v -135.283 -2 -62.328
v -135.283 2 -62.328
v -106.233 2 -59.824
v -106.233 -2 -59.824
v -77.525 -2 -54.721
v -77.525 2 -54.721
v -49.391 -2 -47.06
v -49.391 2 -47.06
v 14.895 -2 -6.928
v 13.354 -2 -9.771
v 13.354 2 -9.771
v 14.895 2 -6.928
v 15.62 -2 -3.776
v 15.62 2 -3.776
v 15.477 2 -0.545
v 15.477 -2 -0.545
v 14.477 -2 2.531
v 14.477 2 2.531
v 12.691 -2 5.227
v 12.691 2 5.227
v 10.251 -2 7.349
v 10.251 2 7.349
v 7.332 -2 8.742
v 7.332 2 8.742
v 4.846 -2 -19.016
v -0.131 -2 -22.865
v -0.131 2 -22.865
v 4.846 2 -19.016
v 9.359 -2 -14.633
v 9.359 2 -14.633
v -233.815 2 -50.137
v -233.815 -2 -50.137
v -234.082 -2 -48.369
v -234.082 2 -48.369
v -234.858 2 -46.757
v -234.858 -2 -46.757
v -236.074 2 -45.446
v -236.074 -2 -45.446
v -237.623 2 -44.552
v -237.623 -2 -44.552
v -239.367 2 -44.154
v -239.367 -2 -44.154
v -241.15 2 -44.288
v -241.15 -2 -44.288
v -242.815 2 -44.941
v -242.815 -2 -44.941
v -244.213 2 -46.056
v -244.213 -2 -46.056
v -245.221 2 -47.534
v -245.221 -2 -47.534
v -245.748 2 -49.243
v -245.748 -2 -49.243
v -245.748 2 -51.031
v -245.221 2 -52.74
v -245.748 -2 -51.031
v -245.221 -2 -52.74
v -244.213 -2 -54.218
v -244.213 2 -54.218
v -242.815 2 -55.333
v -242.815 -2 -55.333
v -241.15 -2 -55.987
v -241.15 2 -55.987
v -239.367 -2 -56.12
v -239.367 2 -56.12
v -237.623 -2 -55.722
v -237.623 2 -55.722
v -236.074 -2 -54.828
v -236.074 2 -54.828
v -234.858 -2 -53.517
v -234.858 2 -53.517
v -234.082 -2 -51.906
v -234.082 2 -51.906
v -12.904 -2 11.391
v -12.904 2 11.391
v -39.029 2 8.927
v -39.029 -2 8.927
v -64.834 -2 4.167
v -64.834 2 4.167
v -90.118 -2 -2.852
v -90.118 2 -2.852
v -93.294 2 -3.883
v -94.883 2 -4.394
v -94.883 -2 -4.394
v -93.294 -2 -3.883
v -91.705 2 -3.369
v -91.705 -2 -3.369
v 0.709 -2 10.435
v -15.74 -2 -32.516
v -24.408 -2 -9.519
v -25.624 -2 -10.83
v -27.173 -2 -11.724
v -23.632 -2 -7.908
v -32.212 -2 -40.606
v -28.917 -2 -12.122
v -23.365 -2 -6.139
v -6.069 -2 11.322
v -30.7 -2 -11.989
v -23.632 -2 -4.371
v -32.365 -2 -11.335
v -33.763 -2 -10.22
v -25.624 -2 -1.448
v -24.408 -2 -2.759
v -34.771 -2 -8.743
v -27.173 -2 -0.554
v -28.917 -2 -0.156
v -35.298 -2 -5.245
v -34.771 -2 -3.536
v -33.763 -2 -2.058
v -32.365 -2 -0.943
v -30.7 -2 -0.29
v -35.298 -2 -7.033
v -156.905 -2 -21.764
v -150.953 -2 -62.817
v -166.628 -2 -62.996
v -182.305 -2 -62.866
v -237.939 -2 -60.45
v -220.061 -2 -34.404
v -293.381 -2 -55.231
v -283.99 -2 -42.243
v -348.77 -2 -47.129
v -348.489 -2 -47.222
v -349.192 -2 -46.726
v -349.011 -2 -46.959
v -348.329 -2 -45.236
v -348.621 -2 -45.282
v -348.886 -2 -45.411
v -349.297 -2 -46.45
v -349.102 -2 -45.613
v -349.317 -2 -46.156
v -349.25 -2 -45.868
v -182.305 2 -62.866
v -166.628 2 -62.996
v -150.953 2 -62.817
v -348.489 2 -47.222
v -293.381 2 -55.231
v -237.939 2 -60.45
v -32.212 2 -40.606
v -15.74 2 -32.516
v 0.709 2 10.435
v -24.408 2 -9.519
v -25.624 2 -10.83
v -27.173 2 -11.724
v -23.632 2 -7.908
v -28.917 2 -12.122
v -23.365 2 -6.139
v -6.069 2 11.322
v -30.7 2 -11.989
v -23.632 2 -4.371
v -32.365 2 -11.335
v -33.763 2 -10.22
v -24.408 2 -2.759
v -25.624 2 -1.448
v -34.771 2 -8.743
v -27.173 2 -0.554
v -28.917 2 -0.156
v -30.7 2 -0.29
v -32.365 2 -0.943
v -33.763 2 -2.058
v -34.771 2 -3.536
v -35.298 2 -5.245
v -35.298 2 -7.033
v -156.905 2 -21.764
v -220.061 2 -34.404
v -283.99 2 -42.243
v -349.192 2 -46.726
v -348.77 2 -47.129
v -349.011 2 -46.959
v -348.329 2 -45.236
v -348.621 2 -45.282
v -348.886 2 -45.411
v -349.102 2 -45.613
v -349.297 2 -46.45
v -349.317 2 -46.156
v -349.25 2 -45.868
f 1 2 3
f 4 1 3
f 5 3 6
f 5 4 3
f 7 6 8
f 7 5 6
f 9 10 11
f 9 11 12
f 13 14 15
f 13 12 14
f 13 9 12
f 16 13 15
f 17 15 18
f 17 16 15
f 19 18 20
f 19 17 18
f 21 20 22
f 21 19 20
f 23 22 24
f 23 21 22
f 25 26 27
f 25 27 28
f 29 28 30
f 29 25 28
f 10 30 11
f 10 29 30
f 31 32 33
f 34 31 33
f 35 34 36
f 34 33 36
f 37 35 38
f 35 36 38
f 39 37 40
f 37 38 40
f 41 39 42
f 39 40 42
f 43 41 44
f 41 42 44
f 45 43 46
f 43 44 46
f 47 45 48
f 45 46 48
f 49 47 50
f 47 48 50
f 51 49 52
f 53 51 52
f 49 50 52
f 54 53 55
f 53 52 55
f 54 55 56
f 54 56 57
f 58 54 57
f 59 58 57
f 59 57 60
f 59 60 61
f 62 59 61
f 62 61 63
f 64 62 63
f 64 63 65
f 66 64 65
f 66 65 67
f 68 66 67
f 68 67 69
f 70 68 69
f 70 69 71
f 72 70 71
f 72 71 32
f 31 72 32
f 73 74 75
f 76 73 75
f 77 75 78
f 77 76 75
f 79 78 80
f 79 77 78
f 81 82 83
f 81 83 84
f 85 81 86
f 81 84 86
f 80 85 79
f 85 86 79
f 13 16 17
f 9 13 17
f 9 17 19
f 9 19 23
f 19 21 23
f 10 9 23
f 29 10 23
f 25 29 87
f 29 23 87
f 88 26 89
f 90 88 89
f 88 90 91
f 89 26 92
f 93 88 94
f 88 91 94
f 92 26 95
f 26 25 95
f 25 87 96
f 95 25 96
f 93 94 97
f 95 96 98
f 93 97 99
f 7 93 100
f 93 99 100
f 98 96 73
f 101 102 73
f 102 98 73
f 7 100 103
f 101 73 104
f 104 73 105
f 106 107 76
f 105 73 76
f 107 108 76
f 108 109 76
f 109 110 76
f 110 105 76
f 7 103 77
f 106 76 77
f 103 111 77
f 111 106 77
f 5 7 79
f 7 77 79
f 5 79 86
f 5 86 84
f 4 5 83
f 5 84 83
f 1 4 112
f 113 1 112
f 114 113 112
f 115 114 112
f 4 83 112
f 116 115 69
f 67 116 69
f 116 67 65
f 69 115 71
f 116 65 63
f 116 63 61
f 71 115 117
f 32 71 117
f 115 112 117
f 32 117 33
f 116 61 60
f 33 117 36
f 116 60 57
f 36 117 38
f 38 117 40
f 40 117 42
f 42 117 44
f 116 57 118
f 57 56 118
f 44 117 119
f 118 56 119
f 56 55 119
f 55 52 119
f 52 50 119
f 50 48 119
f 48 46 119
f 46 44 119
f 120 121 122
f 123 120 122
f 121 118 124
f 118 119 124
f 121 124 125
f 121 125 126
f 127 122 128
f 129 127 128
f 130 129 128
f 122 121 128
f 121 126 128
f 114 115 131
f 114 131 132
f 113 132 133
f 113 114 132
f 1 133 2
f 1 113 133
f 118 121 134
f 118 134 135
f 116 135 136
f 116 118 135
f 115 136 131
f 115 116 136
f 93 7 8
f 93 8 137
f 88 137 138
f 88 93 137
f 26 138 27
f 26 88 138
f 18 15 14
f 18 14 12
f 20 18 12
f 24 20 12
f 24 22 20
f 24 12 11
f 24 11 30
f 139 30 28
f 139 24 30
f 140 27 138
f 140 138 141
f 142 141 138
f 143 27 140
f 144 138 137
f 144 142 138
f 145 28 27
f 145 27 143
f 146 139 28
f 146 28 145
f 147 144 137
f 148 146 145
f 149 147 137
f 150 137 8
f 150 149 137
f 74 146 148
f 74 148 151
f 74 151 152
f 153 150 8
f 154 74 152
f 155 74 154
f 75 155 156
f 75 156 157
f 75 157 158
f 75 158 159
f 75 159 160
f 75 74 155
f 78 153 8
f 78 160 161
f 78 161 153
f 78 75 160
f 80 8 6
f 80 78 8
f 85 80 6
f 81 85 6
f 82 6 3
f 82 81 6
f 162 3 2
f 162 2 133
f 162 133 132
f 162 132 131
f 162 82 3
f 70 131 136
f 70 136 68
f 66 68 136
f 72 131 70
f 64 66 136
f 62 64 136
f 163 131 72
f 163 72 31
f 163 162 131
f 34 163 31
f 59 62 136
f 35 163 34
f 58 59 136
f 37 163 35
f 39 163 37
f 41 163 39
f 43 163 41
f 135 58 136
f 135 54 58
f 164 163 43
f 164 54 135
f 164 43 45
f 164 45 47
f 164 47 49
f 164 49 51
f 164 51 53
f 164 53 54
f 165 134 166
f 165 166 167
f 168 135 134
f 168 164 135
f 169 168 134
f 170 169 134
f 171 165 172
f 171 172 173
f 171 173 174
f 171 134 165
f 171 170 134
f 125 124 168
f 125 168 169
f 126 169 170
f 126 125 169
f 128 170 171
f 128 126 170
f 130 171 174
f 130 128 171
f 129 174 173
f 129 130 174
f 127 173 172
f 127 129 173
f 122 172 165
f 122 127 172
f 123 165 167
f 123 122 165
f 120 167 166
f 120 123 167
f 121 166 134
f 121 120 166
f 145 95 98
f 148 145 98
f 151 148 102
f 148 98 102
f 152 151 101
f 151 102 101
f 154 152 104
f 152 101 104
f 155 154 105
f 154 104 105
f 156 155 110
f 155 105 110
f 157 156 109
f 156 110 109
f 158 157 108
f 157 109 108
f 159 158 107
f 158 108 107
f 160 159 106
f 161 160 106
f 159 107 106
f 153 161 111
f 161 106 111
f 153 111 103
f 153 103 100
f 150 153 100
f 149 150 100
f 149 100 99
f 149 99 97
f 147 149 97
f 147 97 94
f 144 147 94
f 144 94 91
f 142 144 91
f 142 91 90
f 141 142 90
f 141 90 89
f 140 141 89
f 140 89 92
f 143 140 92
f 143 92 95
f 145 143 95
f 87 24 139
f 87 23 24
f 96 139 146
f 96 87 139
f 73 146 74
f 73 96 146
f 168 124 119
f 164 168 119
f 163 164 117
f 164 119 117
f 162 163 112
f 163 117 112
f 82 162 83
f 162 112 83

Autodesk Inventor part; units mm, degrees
ref_plane "YZ Plane" through (0, 0, 0) normal (1, 0, 0) x (0, 1, 0)
ref_plane "XZ Plane" through (0, 0, 0) normal (0, 1, 0) x (-1, 0, 0)
ref_plane "XY Plane" through (0, 0, 0) normal (0, 0, 1) x (1, 0, 0)
sketch "スケッチ1" plane through (0, 0, 0) normal (0, 1, 0) x (-1, 0, 0)
  arc A0 (348.9954, -50.1786) -> (348.3553, -42.2361) centre (348.3204, -46.2359) ccw projected
  arc A1 (182.359, -65.8653) -> (348.9954, -50.1786) centre (162.2533, 1040.6287) ccw projected
  arc A2 (135.1603, -65.3257) -> (182.359, -65.8653) centre (167.871, 731.467) ccw projected
  arc A3 (48.4731, -49.9165) -> (135.1603, -65.3257) centre (148.588, 261.756) ccw projected
  arc A4 (-1.5687, -25.3375) -> (48.4731, -49.9165) centre (107.173, 132.825) ccw projected
  arc A5 (-15.7749, -11.5429) -> (-1.5687, -25.3375) centre (31.9, 23.342) ccw projected
  arc A6 (-8.2474, 11.5993) -> (-15.7749, -11.5429) centre (-3.6695, -2.6851) ccw projected
  arc A7 (13.0537, 14.3873) -> (-8.2474, 11.5993) centre (10.0641, -45.5382) ccw projected
  arc A8 (91.047, 0) -> (13.0537, 14.3873) centre (-1.8944, -285.2401) ccw projected
  arc A9 (91.047, 0) -> (95.8009, -1.5381) centre (462.8125, 1140.9603) ccw projected
  arc A10 (95.8009, -1.5381) -> (348.3553, -42.2361) centre (355.7675, 807.7316) ccw projected
  point P0 (0, 0)
extrude "押し出し1" add sketch "スケッチ1" along normal mid plane 4
sketch "スケッチ2" plane through (0, -2, 0) normal (0, -1, 0) x (1, 0, 0)
  line L0 (0, 0) -> (-283.8627, -59.346)
  arc A0 (-348.9954, -50.1786) -> (-182.359, -65.8653) centre (-162.2533, 1040.6287) ccw projected
  circle A1 centre (-29.3651, -6.1392) radius 6
  circle A2 centre (-239.8151, -50.1371) radius 6
  dimension "d3" = 290
  dimension "d4" = 12
  dimension "d5" = 12
  dimension "d6" = 30
  dimension "d7" = 215
extrude "押し出し2" cut sketch "スケッチ2" against normal through all
thicken "厚み1" operation cut thickness 3 both sides no extend neighbours no toward (0.1519877, 0, -0.9883824) faces at (-226.5779, 0.6667, -32.3934) (-92.1028, 0.6667, -0.3435) (-19.6698, -0.6667, 13.9839) (-3.4686, 0.6667, 14.0982) (9.3583, 0.6667, 11.1943) (14.4364, 0.6667, -13.3021) (-19.7763, 0.6667, -38.0608) (-76.8673, 0.6667, -57.648) (-177.1142, -0.6667, -65.9433) (-238.1449, 0.6667, -63.4427) (-351.8388, 0.6667, -48.1388)
properties part number "flap_m" material "木材 (オーク)"
